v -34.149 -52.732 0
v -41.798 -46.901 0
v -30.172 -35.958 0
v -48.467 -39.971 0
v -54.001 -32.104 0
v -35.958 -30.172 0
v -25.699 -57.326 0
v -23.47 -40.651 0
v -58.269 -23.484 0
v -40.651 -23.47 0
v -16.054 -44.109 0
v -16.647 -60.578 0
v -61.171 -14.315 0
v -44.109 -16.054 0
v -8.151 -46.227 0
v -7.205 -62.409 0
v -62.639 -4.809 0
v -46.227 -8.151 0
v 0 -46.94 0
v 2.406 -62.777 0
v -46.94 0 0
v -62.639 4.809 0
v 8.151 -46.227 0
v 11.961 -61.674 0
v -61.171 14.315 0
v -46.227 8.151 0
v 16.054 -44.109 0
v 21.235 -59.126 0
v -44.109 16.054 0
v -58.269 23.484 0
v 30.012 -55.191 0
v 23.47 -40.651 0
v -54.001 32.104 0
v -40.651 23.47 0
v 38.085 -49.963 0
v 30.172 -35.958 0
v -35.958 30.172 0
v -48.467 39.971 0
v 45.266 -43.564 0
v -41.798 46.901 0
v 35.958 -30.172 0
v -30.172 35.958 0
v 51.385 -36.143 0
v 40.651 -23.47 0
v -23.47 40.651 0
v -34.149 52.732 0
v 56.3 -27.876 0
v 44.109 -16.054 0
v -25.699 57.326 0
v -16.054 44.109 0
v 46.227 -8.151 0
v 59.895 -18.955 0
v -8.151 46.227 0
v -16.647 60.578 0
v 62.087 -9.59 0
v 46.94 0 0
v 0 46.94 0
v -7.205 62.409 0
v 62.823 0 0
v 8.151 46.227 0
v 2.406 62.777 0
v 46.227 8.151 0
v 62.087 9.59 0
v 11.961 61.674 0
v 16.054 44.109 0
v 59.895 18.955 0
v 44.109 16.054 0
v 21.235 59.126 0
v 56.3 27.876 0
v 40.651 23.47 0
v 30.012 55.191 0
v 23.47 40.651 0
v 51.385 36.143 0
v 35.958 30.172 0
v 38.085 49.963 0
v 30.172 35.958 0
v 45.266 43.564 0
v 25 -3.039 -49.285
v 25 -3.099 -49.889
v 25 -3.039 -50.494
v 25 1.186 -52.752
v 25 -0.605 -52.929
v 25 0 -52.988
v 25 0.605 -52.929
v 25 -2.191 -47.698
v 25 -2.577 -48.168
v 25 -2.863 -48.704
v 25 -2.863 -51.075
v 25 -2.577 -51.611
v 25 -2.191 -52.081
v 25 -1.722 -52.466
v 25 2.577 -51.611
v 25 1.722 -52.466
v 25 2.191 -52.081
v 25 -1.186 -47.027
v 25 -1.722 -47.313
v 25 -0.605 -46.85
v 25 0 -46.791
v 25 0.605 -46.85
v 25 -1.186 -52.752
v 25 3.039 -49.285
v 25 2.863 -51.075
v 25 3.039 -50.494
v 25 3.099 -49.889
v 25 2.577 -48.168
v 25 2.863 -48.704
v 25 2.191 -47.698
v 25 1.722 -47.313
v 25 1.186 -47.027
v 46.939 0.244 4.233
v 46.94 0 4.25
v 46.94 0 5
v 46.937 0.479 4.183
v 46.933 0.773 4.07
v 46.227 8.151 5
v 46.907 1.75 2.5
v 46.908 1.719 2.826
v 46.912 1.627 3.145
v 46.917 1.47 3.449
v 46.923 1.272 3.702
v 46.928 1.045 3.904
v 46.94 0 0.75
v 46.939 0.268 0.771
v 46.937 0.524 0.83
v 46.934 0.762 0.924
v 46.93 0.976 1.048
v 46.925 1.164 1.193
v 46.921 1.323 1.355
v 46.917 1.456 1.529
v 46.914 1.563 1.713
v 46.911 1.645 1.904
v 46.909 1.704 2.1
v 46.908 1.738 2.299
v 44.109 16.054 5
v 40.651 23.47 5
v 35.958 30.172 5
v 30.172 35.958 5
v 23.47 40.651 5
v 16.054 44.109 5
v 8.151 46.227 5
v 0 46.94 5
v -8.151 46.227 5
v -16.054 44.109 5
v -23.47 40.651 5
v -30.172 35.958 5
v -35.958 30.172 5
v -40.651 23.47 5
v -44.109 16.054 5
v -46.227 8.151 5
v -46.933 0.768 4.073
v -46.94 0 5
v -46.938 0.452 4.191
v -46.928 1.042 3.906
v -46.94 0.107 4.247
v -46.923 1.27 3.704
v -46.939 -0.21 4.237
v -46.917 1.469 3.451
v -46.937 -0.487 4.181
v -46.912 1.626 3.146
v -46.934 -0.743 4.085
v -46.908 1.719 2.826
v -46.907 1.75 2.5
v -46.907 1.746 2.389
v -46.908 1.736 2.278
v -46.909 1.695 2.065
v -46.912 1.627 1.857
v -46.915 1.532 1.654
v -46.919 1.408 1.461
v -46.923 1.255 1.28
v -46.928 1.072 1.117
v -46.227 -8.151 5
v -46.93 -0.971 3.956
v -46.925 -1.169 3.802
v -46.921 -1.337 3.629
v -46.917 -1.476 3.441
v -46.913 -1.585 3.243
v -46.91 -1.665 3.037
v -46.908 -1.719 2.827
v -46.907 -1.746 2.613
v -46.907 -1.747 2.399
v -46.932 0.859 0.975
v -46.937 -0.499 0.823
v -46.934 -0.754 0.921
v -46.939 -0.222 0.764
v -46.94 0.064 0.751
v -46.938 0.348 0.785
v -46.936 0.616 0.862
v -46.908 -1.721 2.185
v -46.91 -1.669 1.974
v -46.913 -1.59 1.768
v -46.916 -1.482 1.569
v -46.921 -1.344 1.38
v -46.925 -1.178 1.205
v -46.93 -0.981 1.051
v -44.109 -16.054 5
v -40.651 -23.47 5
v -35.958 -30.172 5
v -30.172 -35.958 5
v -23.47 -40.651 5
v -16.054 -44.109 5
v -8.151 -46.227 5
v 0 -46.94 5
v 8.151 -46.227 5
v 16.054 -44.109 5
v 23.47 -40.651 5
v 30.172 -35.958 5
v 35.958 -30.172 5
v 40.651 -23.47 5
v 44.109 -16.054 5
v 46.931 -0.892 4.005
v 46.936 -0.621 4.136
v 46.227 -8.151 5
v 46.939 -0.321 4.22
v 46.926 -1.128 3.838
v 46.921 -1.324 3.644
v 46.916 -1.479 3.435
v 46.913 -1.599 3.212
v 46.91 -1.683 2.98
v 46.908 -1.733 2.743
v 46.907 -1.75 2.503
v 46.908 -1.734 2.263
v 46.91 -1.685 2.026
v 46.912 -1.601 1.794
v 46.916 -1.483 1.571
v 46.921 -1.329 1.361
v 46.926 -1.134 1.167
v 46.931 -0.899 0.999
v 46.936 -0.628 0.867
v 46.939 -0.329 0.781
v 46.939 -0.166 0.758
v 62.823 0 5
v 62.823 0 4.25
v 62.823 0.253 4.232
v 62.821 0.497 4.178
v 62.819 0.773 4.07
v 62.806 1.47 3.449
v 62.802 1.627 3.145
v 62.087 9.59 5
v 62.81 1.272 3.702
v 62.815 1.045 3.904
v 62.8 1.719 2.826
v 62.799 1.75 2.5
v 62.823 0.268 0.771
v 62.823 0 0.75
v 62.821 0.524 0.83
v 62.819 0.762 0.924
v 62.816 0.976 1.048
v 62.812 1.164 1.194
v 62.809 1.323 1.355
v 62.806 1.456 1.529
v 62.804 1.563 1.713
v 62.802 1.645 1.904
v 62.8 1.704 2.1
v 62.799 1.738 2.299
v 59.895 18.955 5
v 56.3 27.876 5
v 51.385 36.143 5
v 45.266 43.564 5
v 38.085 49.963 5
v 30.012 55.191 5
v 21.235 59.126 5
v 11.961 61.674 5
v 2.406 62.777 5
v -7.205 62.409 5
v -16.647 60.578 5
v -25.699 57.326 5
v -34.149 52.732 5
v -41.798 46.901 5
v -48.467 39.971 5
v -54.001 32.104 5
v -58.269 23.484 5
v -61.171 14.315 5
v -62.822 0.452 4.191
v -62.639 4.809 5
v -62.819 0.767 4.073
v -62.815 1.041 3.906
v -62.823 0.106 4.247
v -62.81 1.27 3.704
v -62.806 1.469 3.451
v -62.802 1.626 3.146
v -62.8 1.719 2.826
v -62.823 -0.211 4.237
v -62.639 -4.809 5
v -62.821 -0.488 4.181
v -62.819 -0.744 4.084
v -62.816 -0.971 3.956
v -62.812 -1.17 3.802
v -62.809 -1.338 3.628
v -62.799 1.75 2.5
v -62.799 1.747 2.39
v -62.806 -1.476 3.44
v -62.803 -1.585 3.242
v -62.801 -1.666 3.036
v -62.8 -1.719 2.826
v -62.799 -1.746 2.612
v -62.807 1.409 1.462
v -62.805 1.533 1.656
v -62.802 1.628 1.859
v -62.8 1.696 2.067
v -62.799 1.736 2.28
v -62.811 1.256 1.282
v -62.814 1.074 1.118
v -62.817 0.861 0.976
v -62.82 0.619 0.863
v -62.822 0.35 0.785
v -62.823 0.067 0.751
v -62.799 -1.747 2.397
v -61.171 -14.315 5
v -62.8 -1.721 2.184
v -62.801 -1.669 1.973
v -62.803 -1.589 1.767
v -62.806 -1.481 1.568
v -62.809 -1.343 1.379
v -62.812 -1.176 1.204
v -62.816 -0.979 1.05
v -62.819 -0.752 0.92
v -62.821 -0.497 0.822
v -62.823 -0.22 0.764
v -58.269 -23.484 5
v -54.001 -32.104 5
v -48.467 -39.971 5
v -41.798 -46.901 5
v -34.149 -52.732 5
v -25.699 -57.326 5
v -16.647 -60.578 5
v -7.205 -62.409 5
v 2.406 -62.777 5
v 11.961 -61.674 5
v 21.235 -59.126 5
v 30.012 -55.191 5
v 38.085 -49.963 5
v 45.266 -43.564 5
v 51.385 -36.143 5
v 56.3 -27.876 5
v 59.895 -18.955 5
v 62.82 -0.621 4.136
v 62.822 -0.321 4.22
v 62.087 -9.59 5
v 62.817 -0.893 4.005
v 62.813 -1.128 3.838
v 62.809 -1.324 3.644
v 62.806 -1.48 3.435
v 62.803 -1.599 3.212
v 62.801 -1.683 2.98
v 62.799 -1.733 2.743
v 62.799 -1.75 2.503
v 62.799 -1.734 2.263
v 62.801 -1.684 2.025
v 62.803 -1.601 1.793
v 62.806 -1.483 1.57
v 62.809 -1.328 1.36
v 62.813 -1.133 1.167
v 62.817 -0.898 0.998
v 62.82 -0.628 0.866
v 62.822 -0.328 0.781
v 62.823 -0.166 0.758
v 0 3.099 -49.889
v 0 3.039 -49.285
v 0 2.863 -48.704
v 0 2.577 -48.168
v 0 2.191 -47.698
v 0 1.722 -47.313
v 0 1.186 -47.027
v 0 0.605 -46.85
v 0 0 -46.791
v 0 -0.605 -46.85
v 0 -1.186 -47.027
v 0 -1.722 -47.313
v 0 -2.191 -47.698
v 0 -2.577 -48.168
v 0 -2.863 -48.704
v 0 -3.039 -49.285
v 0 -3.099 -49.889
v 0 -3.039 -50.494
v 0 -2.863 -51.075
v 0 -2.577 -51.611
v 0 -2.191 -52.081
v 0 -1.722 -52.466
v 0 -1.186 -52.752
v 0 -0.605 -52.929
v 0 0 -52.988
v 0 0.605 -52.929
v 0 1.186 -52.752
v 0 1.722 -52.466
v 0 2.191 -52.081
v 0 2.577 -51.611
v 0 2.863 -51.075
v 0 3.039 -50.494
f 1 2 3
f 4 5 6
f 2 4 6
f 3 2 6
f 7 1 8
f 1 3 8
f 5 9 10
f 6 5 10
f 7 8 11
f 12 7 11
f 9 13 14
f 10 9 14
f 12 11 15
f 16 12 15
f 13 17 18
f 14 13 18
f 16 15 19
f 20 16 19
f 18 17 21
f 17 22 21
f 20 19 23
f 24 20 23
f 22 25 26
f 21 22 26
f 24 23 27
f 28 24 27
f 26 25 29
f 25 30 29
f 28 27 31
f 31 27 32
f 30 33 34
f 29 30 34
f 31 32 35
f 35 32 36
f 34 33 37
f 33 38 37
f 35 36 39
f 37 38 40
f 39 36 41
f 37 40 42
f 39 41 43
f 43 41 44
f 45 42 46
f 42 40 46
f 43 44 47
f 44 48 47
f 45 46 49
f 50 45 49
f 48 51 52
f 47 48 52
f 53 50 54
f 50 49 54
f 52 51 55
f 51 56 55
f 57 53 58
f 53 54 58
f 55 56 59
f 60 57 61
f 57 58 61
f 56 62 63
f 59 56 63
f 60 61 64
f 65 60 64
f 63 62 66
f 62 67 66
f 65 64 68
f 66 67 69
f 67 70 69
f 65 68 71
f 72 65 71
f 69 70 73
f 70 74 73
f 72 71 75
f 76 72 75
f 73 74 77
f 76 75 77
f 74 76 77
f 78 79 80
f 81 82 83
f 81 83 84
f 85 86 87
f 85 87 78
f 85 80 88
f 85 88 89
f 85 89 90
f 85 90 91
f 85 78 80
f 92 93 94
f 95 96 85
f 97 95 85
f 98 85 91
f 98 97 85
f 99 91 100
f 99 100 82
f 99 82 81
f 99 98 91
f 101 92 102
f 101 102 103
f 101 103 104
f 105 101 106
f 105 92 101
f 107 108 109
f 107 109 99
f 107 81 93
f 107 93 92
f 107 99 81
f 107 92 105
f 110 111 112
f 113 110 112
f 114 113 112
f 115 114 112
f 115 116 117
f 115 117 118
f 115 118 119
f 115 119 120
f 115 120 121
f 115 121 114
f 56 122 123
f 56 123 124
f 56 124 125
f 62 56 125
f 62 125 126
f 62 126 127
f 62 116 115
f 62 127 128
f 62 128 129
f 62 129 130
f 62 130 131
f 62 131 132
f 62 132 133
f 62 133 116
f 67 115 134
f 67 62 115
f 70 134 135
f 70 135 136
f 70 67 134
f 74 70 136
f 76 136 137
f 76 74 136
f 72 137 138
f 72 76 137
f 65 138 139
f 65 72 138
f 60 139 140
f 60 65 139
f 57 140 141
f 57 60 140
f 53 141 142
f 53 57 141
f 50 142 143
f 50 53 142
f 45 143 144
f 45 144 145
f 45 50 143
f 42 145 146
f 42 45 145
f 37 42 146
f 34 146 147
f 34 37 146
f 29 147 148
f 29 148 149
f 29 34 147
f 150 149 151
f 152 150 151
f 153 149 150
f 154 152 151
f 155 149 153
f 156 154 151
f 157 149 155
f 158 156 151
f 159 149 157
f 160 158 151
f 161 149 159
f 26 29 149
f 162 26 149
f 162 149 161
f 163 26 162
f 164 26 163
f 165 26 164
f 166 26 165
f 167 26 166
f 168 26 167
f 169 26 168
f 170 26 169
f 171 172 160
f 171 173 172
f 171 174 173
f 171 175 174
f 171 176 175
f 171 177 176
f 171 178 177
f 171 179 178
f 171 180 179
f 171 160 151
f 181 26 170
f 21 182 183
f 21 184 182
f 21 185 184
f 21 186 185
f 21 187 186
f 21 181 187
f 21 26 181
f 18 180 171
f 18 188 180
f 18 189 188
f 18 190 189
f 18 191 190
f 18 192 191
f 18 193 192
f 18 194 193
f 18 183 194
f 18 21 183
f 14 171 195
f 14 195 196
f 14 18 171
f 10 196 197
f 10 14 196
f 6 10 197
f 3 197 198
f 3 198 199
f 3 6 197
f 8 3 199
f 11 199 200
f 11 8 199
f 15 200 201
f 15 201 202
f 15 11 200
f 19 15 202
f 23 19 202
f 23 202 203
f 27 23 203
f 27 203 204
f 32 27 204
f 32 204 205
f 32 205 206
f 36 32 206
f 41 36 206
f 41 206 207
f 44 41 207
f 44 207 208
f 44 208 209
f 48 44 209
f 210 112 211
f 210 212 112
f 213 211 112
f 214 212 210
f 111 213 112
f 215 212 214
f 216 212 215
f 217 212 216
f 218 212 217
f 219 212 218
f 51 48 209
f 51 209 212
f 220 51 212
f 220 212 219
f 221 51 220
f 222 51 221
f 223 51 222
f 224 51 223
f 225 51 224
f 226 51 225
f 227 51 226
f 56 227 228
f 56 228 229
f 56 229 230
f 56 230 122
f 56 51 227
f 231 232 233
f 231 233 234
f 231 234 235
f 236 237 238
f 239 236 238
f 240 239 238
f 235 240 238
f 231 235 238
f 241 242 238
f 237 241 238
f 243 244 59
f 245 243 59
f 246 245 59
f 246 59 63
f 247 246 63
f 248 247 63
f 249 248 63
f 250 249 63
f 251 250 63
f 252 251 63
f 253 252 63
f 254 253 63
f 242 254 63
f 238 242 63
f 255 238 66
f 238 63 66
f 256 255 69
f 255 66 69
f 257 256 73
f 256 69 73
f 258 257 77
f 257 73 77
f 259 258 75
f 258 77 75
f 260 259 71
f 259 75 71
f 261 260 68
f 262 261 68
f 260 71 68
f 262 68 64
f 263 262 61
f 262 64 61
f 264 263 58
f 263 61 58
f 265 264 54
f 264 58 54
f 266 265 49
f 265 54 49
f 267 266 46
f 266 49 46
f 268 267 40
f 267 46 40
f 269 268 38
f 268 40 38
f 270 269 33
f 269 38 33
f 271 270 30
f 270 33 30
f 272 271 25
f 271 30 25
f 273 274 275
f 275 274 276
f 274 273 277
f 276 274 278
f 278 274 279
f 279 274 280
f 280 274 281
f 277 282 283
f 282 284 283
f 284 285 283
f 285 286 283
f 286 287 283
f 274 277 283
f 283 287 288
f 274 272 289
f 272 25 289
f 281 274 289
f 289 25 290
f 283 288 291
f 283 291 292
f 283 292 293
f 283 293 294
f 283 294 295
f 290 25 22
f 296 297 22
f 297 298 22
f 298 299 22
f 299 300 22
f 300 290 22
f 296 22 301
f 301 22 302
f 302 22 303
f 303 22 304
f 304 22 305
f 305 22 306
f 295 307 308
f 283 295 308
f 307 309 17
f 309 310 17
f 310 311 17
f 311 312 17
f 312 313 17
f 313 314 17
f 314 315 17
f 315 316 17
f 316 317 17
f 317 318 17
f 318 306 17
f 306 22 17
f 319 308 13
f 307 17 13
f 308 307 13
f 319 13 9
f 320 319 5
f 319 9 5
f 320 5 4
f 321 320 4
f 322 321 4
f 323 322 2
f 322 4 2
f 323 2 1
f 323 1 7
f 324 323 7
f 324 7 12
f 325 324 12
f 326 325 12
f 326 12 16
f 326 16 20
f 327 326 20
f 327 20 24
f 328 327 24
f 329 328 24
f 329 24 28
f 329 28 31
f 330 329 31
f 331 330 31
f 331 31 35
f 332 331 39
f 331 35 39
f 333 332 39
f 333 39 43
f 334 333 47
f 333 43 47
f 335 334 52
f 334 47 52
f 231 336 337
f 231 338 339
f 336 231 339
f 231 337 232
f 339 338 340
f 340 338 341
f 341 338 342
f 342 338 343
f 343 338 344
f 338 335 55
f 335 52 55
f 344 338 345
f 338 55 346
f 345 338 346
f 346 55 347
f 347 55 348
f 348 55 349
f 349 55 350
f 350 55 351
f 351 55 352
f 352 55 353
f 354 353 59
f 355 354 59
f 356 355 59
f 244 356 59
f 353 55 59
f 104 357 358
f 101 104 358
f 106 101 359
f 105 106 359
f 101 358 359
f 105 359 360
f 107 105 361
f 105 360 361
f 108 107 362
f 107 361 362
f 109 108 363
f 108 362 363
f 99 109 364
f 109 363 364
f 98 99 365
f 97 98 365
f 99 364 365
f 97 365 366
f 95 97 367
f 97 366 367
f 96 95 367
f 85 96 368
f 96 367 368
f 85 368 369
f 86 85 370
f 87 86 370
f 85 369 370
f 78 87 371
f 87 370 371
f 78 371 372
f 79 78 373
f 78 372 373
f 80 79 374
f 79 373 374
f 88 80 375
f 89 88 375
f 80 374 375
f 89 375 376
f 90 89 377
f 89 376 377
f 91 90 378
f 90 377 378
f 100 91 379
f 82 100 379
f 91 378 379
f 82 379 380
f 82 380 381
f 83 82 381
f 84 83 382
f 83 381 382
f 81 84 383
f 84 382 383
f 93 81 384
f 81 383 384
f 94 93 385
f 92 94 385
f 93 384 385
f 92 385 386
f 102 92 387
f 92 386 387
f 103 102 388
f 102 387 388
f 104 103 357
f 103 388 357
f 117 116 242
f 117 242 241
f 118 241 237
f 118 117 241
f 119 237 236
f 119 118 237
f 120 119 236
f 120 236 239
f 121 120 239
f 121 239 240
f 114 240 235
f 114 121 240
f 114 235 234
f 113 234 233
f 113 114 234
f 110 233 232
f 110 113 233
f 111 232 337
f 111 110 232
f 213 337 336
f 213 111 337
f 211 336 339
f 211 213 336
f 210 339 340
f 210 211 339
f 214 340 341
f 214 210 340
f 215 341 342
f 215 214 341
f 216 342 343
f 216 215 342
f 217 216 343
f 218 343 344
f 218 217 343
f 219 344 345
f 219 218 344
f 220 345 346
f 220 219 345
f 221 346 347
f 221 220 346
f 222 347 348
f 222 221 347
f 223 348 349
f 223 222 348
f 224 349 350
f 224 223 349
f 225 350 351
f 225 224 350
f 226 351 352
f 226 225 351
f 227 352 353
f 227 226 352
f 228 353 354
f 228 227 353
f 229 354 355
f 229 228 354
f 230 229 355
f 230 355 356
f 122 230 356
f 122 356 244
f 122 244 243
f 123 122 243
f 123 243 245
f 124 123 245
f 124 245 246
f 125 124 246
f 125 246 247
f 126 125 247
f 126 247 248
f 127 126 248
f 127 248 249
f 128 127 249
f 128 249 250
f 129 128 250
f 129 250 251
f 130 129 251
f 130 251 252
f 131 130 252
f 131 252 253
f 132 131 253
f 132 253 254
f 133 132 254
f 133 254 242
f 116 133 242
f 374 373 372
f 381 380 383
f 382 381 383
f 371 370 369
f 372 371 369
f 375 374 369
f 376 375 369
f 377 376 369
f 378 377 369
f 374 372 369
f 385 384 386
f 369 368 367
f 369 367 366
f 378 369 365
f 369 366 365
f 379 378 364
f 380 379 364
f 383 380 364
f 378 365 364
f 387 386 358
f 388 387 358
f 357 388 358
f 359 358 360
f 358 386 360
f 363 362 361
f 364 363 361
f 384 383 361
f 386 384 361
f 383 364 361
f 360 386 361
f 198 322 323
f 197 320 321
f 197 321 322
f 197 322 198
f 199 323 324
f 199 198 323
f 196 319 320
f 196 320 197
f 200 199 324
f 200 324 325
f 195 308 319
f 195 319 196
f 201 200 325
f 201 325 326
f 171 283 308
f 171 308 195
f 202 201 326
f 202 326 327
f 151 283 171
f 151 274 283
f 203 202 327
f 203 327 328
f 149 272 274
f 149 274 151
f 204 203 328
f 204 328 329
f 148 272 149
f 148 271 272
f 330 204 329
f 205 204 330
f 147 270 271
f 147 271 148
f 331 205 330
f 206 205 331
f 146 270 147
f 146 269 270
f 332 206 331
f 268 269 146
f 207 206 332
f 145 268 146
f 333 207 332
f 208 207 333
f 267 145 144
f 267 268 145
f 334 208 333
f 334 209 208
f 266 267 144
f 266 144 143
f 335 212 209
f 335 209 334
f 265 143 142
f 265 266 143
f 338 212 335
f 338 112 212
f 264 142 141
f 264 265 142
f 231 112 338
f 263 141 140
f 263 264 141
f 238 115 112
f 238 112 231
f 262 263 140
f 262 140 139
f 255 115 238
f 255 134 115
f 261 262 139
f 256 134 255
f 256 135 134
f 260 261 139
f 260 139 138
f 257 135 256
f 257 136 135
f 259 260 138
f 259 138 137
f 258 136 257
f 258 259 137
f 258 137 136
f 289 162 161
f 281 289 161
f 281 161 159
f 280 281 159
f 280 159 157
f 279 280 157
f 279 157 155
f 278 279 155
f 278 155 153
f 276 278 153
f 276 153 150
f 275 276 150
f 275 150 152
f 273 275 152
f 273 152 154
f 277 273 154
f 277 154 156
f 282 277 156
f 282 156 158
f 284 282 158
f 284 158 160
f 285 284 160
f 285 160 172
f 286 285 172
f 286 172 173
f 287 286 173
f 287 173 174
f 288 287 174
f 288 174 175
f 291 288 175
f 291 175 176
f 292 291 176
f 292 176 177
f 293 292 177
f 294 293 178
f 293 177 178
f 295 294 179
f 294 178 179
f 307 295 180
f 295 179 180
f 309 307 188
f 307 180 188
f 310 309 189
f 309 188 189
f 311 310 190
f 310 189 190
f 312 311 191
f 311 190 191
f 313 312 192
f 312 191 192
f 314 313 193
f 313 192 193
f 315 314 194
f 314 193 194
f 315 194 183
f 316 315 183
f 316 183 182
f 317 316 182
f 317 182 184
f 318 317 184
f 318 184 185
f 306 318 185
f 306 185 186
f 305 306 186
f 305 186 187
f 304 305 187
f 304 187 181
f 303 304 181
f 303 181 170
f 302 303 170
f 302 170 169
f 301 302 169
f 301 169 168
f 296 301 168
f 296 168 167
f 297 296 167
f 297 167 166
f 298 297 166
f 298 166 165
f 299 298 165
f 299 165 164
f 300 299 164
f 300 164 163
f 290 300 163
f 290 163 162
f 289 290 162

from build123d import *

# Parameters (mm, degrees)
F0_R          = 62.823284417
F0_R_2        = 46.9397632094
F1_DEPTH      = 5
F2_R          = 3.0987822173
F3_DEPTH      = 25
F4_R          = 1.75
F5_DEPTH      = 94.8
F5_DEPTH_BACK = 86.7


with BuildPart() as f1:
    # F0 (on Top) → F1 (new body)
    with BuildSketch(Plane.XY):
        Circle(F0_R)
        Circle(F0_R_2, mode=Mode.SUBTRACT)
    extrude(amount=F1_DEPTH)

    # F4 (on Right) → F5 (cut, two sides)
    with BuildSketch(Plane.YZ) as f5_sk:
        with Locations((0, 2.5)):
            Circle(F4_R)
    extrude(amount=-F5_DEPTH, mode=Mode.SUBTRACT)
    extrude(f5_sk.sketch, amount=F5_DEPTH_BACK, mode=Mode.SUBTRACT)


with BuildPart() as f3:
    # F2 (on Right) → F3 (new body)
    with BuildSketch(Plane.YZ):
        with Locations((0, -49.8894266784)):
            Circle(F2_R)
    extrude(amount=F3_DEPTH)


solid = Compound([f1.part, f3.part])
